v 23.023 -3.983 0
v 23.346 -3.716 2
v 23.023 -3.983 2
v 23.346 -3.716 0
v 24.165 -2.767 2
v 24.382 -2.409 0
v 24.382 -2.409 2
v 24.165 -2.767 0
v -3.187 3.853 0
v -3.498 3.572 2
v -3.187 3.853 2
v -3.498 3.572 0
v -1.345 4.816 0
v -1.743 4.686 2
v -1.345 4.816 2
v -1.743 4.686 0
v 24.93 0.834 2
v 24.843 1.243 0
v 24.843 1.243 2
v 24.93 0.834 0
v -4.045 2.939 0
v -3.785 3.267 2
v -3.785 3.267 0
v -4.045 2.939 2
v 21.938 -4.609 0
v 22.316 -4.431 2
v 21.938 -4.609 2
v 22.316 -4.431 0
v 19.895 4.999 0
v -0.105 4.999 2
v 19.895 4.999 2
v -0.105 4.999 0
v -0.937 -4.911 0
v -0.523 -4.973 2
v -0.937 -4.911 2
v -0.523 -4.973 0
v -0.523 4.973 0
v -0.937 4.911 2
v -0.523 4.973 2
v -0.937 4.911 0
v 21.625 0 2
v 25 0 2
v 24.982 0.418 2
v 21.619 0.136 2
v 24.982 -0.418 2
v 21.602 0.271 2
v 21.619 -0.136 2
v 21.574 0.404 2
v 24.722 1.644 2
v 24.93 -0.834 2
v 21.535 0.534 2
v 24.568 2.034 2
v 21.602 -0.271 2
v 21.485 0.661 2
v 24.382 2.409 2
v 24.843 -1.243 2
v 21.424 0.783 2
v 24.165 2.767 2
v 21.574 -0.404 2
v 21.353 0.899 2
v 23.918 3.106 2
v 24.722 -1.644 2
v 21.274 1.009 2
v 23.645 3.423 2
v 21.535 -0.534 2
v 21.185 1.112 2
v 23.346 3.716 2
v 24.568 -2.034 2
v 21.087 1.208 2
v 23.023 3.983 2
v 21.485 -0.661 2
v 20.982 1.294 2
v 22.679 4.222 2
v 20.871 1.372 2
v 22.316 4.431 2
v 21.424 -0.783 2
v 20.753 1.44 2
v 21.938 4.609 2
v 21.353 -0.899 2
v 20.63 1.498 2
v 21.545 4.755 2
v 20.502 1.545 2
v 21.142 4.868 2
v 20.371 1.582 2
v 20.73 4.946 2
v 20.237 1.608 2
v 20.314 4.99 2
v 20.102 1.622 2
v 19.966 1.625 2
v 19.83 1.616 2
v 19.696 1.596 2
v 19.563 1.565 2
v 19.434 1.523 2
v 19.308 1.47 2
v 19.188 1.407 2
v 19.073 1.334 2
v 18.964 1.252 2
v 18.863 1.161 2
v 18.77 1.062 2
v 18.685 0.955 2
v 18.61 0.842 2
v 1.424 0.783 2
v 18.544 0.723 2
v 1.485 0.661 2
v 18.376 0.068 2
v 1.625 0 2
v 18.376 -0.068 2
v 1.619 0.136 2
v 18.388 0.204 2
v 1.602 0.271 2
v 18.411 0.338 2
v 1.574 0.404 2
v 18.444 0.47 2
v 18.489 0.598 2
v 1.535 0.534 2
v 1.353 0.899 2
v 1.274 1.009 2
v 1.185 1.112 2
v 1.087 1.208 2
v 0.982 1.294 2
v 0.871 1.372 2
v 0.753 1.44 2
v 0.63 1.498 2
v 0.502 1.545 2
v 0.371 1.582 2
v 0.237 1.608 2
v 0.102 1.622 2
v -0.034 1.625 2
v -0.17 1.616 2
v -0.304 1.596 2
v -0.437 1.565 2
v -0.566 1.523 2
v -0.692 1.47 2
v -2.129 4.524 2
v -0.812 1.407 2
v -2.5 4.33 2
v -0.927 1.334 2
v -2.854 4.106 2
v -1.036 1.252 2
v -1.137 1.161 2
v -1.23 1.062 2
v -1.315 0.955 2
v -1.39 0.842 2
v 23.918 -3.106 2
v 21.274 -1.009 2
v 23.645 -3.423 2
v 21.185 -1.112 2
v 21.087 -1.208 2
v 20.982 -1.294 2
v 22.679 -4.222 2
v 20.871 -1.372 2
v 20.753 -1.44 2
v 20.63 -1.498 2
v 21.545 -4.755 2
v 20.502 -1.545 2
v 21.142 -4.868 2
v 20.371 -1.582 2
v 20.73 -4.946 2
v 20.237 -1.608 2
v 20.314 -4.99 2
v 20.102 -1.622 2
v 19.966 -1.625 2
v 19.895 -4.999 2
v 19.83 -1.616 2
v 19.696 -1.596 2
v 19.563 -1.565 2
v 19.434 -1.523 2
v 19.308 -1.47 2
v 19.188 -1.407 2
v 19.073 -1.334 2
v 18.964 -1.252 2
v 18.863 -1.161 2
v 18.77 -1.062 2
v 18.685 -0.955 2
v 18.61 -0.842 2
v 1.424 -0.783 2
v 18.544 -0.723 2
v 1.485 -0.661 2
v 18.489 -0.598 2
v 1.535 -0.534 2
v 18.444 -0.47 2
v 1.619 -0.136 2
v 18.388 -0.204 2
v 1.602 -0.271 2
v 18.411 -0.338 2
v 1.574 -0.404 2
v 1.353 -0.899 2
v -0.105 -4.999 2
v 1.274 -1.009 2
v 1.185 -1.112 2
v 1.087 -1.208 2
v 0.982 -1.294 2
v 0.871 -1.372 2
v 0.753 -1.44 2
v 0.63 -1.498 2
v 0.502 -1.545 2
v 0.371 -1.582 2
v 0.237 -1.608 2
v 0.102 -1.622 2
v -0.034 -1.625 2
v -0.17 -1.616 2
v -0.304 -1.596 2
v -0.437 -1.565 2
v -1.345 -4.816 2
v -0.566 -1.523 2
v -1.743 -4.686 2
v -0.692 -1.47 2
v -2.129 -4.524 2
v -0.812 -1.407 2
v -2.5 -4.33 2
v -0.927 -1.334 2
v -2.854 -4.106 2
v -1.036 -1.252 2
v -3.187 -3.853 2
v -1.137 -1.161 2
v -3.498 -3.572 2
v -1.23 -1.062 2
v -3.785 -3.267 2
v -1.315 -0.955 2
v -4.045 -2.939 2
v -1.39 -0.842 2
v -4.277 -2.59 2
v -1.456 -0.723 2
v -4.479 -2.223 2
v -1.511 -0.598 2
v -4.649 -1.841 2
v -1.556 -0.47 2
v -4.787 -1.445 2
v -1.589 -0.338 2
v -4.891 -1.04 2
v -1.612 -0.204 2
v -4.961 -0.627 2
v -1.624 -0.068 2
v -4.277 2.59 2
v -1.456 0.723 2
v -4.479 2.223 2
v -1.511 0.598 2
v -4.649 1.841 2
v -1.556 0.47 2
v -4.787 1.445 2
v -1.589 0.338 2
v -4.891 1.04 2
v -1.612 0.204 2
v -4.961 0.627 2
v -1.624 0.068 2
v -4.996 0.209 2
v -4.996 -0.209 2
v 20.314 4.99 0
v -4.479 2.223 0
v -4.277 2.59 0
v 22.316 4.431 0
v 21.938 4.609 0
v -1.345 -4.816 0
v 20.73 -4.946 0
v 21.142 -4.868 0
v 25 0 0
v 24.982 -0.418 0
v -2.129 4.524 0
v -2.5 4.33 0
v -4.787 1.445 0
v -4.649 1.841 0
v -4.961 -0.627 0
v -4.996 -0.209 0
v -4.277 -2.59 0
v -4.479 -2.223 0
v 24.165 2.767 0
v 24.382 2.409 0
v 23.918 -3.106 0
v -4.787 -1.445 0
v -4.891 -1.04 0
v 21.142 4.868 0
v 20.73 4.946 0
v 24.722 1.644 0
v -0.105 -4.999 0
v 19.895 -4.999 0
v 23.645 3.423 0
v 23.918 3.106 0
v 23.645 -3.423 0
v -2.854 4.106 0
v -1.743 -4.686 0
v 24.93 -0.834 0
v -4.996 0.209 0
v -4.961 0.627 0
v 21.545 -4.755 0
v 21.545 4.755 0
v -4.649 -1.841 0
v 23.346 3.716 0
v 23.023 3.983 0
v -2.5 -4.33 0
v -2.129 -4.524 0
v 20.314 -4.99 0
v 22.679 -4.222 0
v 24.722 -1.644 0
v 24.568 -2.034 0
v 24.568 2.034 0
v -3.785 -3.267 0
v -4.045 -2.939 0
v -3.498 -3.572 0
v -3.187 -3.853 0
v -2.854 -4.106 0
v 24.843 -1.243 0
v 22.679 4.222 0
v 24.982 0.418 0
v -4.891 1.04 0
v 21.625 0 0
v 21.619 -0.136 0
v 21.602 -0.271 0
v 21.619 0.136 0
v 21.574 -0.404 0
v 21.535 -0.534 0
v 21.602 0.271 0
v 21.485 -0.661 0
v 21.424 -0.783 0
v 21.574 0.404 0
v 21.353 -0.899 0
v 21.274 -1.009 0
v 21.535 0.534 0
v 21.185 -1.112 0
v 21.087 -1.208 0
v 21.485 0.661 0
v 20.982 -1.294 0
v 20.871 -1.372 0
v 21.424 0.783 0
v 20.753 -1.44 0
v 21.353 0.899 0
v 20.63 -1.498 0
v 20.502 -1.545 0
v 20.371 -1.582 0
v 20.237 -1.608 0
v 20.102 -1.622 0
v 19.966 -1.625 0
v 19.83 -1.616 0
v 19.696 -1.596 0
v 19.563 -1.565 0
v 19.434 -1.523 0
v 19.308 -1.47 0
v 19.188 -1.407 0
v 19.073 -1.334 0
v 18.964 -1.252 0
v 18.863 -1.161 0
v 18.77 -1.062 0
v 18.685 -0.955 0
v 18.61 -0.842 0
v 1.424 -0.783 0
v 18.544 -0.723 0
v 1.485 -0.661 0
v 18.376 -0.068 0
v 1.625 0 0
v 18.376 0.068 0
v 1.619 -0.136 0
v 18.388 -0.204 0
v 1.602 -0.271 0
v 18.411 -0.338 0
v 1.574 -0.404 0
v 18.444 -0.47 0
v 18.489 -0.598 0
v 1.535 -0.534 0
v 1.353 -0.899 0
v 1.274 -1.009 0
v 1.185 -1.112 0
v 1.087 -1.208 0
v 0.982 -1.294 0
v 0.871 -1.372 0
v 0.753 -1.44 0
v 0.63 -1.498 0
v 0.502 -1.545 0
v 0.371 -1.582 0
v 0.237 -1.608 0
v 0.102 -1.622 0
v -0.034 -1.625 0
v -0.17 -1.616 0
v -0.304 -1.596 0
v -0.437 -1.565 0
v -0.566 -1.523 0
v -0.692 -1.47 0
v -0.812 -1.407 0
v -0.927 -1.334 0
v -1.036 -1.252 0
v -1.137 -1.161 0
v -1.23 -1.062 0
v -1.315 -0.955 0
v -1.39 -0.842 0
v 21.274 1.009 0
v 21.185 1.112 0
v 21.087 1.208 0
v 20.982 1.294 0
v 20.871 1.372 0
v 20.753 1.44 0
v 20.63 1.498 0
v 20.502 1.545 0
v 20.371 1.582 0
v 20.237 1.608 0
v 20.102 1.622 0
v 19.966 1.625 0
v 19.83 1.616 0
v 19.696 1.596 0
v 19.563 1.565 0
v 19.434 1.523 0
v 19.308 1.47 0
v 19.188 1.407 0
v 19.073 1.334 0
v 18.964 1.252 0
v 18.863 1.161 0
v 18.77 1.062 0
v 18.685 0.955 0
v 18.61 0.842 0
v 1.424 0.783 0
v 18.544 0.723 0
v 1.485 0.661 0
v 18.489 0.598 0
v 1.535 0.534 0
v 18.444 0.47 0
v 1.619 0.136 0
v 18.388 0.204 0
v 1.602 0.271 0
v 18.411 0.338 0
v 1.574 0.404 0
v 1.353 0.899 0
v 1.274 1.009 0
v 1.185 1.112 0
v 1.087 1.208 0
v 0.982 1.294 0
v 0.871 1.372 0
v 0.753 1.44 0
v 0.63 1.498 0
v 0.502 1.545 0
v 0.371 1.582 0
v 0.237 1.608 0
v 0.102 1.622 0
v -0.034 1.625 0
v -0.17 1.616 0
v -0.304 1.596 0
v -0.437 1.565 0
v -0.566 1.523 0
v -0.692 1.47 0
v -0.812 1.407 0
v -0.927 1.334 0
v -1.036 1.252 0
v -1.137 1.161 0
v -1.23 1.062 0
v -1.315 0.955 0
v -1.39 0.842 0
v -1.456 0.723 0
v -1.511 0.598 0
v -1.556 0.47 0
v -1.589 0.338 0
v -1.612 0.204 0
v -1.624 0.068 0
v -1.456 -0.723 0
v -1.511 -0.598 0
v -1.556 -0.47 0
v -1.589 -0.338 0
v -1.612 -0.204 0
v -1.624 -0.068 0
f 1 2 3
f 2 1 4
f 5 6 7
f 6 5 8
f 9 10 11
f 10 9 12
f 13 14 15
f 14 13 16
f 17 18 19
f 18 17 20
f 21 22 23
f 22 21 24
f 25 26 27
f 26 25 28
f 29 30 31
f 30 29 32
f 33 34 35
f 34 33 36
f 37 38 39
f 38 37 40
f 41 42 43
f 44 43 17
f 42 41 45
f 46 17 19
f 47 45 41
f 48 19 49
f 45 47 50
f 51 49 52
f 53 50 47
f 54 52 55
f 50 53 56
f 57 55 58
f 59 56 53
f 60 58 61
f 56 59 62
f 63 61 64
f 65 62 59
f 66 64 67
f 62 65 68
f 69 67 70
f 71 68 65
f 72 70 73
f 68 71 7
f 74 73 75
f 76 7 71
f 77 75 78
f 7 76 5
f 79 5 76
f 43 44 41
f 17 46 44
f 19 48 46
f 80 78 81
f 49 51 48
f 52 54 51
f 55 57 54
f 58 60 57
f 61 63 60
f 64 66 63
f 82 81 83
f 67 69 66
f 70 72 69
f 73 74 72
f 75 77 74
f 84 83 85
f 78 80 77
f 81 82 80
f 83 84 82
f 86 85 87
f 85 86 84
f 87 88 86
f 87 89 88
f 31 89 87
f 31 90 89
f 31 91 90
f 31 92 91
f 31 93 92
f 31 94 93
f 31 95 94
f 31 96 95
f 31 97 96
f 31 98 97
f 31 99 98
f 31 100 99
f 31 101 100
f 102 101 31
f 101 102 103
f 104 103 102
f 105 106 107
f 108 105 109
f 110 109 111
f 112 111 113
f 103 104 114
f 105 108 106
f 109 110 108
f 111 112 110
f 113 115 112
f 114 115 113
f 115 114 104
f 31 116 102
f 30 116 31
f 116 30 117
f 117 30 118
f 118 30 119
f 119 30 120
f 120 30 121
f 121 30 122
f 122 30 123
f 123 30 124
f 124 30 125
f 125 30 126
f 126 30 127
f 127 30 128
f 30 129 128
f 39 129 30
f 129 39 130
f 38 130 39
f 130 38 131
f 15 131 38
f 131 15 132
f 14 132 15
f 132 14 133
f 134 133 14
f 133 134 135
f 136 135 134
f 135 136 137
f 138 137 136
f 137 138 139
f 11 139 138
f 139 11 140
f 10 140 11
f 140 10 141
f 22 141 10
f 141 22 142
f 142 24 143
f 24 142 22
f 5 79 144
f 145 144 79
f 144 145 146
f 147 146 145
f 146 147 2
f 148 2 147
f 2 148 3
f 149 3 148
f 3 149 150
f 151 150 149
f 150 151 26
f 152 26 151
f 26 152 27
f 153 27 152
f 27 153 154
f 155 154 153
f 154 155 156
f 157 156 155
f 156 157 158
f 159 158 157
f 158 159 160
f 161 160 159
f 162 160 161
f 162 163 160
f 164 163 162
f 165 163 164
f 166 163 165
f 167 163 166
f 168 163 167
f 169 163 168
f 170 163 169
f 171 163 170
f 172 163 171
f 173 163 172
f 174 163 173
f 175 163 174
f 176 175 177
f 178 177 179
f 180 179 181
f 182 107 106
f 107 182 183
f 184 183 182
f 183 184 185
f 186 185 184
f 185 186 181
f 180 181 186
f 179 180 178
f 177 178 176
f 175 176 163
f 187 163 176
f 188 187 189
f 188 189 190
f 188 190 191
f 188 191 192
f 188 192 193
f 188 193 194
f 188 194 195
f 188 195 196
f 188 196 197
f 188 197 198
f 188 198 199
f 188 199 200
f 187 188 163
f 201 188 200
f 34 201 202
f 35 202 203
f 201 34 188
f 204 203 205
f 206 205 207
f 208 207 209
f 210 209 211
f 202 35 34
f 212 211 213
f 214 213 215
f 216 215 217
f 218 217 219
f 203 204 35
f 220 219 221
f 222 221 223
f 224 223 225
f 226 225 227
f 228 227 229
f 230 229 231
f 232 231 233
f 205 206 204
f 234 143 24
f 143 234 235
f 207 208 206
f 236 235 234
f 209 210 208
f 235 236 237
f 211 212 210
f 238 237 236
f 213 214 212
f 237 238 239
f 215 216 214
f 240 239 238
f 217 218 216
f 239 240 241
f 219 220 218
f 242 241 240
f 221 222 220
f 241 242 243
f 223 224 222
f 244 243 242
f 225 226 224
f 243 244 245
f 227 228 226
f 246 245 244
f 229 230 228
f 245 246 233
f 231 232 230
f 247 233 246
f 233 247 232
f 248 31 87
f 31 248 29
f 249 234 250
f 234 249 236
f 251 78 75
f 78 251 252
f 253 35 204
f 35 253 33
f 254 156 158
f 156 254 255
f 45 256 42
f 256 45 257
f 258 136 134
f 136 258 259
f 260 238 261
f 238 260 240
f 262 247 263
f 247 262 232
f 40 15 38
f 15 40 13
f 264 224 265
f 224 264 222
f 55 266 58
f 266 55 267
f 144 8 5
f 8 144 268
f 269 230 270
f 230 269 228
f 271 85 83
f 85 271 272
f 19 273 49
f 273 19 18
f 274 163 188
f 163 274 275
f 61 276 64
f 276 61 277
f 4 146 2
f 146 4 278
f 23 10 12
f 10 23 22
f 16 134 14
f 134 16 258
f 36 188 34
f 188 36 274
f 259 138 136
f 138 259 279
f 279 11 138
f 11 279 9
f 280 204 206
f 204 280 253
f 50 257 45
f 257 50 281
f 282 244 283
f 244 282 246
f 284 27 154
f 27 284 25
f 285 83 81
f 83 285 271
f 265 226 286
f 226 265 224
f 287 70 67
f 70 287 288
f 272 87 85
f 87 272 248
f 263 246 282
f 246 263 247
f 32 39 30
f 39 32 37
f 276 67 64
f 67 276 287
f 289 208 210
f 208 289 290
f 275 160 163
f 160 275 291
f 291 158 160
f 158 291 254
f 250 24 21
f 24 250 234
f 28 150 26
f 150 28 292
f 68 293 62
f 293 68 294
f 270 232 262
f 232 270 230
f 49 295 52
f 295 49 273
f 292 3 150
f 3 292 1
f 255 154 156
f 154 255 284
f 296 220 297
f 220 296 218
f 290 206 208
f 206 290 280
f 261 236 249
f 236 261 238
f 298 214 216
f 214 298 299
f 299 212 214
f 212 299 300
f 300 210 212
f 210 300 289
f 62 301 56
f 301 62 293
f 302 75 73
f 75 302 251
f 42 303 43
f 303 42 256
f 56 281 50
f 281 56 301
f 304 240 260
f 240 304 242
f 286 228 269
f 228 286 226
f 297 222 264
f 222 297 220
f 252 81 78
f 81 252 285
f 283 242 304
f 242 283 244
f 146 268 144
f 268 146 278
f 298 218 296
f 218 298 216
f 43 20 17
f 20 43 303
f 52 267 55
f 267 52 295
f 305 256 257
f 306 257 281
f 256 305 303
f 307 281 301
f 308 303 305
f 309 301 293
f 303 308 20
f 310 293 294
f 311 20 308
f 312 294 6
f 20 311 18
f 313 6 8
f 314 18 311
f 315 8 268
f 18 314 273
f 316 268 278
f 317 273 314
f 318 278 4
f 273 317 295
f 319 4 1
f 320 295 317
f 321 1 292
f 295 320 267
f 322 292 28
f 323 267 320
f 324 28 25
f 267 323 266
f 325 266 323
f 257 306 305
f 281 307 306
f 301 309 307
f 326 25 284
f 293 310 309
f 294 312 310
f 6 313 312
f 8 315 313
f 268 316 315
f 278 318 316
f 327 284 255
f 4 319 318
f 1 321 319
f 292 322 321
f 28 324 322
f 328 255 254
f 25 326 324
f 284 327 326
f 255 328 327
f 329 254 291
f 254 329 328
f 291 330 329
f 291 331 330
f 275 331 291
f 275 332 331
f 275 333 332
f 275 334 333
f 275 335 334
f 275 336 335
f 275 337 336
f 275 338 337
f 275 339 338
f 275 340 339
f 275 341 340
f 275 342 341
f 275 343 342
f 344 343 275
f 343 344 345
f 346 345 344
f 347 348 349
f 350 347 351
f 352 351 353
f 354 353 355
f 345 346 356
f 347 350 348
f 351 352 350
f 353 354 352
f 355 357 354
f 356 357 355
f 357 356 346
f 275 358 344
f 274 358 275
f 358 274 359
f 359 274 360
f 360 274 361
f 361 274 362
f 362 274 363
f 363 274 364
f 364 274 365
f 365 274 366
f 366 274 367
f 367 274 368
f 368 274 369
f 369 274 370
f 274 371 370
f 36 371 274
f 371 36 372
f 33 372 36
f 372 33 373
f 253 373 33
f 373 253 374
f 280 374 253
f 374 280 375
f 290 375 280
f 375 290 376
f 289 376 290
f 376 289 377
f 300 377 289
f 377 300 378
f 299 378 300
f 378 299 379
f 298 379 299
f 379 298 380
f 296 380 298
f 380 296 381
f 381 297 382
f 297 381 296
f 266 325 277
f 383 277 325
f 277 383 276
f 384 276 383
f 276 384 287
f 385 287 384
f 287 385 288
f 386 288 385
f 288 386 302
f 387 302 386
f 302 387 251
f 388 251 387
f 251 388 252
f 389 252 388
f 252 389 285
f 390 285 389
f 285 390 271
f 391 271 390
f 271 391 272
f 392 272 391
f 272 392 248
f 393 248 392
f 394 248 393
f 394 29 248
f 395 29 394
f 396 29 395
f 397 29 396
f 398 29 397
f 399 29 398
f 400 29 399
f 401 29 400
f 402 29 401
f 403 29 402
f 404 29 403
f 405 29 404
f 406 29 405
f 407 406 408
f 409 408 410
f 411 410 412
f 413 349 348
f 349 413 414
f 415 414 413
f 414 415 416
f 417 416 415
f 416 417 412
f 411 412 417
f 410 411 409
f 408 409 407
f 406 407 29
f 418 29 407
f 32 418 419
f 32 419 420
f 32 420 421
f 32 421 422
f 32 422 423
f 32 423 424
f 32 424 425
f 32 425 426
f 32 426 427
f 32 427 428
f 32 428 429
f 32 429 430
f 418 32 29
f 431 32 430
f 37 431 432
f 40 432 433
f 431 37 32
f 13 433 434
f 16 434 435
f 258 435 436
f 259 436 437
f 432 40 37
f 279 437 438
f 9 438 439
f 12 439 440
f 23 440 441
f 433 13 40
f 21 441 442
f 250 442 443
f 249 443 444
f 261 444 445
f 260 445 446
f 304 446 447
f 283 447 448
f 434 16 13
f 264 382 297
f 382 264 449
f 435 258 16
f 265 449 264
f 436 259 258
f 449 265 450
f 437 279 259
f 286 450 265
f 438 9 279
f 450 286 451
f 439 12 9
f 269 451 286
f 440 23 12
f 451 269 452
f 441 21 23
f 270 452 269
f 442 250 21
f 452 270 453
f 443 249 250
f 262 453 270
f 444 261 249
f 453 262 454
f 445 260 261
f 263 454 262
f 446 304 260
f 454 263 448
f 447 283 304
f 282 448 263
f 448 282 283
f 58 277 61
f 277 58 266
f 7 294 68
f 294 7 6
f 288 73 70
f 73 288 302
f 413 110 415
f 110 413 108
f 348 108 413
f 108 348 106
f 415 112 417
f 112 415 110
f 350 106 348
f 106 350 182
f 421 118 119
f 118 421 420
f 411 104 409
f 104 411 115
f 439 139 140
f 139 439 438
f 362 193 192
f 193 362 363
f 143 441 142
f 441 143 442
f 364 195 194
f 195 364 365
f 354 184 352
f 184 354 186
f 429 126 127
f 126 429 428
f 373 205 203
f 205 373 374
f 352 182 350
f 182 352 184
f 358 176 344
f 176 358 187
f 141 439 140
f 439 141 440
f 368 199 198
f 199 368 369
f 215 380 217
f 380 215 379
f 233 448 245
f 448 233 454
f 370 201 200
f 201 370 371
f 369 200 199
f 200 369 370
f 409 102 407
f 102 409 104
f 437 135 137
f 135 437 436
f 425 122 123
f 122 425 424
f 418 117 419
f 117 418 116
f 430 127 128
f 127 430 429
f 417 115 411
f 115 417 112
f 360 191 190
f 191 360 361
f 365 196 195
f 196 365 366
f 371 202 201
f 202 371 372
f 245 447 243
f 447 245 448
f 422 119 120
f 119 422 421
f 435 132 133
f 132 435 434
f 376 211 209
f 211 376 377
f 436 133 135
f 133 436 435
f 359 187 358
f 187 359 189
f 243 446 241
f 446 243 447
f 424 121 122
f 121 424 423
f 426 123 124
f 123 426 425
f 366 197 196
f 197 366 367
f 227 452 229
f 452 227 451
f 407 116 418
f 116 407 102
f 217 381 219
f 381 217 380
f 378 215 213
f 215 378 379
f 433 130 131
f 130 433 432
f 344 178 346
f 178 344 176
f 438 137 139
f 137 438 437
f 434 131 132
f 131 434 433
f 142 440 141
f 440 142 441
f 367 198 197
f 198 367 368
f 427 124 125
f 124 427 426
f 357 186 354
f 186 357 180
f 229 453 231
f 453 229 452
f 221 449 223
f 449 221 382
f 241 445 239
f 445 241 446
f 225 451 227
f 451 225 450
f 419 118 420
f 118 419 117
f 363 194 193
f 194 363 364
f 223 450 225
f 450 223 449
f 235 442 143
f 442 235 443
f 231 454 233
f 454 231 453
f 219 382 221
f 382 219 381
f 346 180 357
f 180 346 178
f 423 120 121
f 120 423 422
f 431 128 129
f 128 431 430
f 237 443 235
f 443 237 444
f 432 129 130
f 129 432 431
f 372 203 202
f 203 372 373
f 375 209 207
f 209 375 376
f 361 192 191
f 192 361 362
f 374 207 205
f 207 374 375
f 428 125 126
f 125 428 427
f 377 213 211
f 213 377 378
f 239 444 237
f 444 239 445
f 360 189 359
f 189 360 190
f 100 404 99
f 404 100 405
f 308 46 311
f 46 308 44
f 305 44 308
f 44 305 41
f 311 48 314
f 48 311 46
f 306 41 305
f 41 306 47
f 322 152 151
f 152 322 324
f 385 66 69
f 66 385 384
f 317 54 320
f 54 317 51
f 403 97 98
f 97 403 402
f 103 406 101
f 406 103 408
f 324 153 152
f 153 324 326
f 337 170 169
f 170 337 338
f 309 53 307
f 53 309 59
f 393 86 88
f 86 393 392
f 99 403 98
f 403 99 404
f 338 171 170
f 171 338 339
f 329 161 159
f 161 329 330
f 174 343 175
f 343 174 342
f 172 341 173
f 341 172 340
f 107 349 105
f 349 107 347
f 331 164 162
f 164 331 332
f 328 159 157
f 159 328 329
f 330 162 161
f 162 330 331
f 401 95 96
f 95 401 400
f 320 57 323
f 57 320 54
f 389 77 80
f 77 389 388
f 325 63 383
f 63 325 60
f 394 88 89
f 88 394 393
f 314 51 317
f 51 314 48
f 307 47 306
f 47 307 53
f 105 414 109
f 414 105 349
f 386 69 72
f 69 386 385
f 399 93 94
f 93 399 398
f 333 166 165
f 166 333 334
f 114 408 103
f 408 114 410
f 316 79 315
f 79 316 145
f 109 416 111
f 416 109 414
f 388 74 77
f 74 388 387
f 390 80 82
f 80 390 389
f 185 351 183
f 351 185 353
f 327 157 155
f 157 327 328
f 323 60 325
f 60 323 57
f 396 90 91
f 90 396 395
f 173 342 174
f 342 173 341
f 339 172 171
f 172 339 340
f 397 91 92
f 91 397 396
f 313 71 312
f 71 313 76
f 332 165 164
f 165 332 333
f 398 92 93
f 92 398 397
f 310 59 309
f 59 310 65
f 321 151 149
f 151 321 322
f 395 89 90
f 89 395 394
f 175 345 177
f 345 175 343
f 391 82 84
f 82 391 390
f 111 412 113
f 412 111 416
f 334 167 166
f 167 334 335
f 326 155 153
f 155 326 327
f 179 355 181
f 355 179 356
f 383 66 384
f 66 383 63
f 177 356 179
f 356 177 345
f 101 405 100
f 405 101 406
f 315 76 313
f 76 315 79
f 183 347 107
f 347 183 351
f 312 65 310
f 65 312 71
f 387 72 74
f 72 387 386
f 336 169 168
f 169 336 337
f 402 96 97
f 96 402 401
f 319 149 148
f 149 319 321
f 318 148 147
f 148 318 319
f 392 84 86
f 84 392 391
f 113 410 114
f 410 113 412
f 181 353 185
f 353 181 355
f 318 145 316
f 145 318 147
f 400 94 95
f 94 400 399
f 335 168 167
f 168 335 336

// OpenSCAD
$fn = 75;

difference() {
	hull() {
		cylinder(d = 10, h = 2);
		translate(v = [20, 0, 0]) {
			cylinder(d = 10, h = 2);
		}
	}
	translate(v = [0, 0, -1]) {
		cylinder(d = 3.25, h = 4);
	}
	translate(v = [20, 0, -1]) {
		cylinder(d = 3.25, h = 4);
	}
}
